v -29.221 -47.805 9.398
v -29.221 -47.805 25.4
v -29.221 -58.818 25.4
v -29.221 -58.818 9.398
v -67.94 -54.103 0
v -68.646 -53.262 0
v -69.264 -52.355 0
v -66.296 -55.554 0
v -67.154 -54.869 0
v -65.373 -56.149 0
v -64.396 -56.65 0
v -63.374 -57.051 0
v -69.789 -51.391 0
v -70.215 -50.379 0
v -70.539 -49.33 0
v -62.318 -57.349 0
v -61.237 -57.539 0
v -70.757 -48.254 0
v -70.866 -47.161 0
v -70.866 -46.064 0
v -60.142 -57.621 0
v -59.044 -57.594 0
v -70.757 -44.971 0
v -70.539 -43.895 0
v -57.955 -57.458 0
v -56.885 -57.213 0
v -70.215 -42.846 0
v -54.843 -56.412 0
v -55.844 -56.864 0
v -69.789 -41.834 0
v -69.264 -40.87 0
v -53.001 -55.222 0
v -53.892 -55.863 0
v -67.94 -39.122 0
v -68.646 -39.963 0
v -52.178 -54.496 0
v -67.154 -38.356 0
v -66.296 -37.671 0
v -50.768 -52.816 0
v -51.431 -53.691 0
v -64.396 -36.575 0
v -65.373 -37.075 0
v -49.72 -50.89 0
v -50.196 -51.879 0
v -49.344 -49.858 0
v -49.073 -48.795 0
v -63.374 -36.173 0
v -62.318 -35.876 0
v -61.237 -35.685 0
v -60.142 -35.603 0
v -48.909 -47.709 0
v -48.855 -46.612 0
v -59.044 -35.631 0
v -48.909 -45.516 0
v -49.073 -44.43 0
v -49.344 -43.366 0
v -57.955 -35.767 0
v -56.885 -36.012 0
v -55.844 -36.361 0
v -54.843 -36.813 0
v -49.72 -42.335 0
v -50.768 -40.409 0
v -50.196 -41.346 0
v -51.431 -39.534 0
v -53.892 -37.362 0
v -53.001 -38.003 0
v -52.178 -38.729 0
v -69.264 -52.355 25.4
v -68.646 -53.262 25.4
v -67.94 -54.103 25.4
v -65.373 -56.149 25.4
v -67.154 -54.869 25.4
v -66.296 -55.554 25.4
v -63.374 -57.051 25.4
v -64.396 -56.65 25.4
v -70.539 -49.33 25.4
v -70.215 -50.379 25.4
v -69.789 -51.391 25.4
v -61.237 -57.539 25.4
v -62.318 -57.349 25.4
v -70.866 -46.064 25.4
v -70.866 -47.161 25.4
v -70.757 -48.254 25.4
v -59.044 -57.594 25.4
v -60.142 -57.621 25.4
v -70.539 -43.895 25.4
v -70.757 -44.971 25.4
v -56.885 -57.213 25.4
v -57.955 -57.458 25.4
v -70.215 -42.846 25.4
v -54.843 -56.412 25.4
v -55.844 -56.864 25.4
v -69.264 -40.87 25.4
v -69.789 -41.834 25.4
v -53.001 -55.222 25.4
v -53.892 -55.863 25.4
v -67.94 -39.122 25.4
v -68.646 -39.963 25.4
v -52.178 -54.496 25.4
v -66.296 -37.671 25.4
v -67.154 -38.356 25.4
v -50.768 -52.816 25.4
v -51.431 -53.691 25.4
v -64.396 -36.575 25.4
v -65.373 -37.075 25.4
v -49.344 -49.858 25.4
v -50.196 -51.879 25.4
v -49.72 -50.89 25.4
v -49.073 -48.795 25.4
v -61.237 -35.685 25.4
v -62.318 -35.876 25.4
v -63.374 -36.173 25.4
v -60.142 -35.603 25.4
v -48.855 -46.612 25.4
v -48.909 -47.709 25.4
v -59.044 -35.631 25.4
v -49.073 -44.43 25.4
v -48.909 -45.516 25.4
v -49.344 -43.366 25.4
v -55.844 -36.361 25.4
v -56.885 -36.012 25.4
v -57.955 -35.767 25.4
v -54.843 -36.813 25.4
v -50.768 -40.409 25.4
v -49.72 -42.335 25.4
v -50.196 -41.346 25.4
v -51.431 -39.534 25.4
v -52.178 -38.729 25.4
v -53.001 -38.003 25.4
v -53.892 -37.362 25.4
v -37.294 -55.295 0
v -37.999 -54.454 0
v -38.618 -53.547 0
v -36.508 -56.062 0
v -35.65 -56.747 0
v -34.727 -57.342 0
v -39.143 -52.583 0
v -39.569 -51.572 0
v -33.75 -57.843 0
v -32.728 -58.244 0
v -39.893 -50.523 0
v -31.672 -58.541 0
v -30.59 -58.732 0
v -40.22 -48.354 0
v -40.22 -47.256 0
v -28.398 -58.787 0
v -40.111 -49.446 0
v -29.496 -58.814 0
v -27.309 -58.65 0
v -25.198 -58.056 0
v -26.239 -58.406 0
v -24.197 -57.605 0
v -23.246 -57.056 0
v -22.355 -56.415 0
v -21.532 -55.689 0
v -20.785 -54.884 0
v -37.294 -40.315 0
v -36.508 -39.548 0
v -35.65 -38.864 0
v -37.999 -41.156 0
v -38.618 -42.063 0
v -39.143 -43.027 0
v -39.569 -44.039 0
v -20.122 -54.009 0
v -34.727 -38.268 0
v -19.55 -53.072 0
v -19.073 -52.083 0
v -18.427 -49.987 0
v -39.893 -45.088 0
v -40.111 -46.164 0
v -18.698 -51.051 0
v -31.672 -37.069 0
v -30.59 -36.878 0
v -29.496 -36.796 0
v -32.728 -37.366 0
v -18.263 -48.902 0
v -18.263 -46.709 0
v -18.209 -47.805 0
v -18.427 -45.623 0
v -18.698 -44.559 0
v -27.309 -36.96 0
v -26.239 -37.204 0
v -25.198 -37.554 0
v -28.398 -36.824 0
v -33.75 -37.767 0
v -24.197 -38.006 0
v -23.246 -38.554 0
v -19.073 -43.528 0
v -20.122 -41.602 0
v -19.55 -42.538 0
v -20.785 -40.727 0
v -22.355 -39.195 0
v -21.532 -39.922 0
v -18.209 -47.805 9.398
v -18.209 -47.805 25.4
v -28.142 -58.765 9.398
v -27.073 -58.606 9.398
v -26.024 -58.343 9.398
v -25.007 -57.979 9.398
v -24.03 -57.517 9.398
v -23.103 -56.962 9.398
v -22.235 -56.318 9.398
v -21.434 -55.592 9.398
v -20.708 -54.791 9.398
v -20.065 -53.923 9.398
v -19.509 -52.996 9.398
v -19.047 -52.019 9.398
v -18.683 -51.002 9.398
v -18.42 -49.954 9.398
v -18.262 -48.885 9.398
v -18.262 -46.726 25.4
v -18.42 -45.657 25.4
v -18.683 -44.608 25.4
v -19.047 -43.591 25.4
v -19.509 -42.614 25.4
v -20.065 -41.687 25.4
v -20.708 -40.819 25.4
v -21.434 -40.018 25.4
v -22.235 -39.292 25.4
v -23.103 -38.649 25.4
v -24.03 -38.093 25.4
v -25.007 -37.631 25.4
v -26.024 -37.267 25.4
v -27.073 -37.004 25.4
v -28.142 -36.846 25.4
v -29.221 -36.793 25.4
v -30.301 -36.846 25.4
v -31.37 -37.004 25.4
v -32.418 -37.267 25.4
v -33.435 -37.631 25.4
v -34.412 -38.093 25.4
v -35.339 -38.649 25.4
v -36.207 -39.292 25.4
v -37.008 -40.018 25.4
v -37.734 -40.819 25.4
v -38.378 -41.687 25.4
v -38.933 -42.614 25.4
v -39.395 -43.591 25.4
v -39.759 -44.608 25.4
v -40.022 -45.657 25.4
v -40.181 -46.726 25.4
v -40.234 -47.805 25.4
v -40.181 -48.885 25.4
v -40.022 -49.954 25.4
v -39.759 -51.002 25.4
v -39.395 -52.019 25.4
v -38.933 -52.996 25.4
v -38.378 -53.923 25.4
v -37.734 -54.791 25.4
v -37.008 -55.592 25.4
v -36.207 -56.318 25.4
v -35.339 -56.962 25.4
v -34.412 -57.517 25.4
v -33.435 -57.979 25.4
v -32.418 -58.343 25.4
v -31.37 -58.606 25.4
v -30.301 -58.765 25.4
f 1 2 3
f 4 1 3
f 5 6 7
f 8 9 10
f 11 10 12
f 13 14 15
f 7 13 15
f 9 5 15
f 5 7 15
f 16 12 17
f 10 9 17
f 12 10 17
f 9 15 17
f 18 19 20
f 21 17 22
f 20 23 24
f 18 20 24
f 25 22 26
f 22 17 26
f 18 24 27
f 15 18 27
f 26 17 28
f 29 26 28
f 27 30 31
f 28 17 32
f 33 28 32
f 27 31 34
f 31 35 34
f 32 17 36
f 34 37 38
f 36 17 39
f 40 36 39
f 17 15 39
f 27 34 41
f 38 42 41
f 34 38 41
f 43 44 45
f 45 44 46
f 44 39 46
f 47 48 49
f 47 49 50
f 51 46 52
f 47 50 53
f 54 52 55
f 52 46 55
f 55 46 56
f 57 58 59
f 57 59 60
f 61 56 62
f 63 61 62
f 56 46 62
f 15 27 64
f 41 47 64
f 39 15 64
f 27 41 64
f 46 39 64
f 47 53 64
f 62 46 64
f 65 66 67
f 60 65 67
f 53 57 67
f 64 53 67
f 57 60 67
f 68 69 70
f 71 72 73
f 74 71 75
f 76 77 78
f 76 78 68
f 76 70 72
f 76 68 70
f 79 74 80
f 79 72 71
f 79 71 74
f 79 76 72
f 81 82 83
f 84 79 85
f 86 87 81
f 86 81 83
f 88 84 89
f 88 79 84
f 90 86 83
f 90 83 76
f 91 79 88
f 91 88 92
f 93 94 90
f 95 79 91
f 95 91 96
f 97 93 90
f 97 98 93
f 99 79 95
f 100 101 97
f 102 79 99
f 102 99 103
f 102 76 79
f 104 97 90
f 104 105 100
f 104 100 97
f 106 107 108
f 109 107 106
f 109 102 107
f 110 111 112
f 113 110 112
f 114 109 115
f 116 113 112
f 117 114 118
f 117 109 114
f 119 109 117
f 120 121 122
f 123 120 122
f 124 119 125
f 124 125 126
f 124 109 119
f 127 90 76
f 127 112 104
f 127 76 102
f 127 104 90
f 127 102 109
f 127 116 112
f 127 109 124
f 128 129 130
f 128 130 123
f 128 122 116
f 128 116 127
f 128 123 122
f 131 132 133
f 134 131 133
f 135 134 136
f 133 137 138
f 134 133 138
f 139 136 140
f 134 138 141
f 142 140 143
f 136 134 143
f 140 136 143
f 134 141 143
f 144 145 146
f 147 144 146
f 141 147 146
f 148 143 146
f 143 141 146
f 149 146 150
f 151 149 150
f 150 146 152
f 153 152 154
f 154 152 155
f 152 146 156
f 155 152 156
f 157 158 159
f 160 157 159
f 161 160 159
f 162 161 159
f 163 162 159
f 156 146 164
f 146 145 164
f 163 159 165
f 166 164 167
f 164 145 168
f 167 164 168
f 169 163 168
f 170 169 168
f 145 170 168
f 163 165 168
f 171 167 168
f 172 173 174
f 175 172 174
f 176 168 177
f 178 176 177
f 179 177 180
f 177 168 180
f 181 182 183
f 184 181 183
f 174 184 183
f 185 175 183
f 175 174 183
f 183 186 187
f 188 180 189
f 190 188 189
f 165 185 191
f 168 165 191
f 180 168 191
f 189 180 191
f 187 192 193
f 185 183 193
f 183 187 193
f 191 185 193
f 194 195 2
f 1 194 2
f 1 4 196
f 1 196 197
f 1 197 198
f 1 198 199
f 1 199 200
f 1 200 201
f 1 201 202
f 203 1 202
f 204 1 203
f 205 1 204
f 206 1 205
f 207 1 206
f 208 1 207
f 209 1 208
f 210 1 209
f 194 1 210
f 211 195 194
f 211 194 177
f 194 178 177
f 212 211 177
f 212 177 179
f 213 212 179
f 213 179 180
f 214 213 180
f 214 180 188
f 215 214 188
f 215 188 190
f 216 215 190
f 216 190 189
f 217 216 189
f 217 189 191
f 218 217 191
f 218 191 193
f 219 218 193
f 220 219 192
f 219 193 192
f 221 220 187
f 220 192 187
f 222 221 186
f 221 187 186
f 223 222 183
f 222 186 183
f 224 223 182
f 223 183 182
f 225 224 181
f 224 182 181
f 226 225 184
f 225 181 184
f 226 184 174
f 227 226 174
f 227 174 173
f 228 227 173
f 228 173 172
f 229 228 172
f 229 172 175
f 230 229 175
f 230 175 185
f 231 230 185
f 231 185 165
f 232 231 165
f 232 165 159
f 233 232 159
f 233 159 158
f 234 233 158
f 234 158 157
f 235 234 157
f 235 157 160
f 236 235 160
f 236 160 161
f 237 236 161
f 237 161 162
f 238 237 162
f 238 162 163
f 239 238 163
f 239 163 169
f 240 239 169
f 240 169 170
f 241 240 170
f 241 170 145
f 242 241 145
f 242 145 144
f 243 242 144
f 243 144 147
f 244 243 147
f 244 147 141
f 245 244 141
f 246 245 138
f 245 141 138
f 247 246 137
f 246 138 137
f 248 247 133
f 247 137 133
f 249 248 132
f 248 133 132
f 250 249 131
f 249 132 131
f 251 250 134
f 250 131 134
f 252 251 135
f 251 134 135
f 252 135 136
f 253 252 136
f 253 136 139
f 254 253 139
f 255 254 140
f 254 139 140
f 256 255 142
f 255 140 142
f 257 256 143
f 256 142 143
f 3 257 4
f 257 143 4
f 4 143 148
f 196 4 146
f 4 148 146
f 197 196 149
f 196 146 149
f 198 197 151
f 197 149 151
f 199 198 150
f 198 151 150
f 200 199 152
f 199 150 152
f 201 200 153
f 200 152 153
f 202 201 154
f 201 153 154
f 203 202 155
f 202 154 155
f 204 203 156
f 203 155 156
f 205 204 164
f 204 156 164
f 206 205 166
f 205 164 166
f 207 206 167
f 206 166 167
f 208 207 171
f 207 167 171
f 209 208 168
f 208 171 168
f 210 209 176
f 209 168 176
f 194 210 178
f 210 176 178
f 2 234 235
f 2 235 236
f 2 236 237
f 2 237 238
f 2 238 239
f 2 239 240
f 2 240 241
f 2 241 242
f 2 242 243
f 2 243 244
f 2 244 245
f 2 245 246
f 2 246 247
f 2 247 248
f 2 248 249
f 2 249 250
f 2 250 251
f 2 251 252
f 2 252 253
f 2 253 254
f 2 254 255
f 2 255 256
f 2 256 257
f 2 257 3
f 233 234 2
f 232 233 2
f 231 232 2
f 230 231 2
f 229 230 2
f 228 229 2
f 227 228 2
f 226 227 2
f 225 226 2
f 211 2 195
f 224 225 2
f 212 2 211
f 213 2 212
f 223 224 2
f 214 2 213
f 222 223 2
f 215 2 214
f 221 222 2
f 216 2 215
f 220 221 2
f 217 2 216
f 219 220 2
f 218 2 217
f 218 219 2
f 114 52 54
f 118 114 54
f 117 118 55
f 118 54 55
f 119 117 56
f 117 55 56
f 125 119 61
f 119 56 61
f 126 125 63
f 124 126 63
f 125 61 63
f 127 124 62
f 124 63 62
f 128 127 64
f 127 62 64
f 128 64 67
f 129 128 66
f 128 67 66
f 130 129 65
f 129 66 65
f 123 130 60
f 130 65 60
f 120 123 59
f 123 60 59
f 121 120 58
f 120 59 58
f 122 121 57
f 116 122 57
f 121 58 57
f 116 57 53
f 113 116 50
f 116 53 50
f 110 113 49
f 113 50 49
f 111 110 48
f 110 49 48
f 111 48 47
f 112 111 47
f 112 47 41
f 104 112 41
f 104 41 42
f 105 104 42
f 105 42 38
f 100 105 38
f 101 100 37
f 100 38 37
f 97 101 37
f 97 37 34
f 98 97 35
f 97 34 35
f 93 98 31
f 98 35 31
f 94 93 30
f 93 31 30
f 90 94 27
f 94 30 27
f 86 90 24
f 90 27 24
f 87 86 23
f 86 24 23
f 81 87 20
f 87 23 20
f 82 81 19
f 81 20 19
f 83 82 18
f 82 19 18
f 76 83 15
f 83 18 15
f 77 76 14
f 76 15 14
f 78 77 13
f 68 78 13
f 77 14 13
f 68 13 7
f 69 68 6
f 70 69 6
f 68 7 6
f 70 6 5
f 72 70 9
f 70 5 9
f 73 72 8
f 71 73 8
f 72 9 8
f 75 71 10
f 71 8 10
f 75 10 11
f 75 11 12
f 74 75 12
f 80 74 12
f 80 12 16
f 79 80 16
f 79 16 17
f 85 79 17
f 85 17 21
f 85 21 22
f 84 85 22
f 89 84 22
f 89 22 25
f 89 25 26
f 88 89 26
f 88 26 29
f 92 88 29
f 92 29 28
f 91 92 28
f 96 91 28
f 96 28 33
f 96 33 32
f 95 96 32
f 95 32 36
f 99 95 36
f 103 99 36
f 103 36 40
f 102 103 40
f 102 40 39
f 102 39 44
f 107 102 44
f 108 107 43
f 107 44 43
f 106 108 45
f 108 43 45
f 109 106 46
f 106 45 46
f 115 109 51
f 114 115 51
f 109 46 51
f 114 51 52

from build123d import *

# Parameters (mm, degrees)
F0_R     = 11.0124100744
F1_DEPTH = 25.4
F3_DEPTH = 16.002


with BuildPart() as f1:
    # F0 (on Top) → F1 (new body)
    with BuildSketch(Plane.XY):
        with Locations((-59.8671808839, -46.6124415398)):
            Circle(F0_R)
    extrude(amount=F1_DEPTH)


with BuildPart() as f1b:
    # F0 (on Top) → F1, piece 2 (new body)
    with BuildSketch(Plane.XY):
        with Locations((-29.2211379856, -47.8051416576)):
            Circle(F0_R)
    extrude(amount=F1_DEPTH)

    # F2 (on face) → F3 (cut)
    with BuildSketch(Plane.XY.offset(25.4)):
        with BuildLine():
            Line((-18.2087279112, -47.8051416576), (-29.2211379856, -47.8051416576))
            Line((-29.2211379856, -47.8051416576), (-29.2211379856, -58.817551732))
            ThreePointArc((-29.2211379856, -58.817551732), (-21.4341881448, -55.5920914984), (-18.2087279112, -47.8051416576))
        make_face()
    extrude(amount=-F3_DEPTH, mode=Mode.SUBTRACT)


solid = Compound([f1.part, f1b.part])
